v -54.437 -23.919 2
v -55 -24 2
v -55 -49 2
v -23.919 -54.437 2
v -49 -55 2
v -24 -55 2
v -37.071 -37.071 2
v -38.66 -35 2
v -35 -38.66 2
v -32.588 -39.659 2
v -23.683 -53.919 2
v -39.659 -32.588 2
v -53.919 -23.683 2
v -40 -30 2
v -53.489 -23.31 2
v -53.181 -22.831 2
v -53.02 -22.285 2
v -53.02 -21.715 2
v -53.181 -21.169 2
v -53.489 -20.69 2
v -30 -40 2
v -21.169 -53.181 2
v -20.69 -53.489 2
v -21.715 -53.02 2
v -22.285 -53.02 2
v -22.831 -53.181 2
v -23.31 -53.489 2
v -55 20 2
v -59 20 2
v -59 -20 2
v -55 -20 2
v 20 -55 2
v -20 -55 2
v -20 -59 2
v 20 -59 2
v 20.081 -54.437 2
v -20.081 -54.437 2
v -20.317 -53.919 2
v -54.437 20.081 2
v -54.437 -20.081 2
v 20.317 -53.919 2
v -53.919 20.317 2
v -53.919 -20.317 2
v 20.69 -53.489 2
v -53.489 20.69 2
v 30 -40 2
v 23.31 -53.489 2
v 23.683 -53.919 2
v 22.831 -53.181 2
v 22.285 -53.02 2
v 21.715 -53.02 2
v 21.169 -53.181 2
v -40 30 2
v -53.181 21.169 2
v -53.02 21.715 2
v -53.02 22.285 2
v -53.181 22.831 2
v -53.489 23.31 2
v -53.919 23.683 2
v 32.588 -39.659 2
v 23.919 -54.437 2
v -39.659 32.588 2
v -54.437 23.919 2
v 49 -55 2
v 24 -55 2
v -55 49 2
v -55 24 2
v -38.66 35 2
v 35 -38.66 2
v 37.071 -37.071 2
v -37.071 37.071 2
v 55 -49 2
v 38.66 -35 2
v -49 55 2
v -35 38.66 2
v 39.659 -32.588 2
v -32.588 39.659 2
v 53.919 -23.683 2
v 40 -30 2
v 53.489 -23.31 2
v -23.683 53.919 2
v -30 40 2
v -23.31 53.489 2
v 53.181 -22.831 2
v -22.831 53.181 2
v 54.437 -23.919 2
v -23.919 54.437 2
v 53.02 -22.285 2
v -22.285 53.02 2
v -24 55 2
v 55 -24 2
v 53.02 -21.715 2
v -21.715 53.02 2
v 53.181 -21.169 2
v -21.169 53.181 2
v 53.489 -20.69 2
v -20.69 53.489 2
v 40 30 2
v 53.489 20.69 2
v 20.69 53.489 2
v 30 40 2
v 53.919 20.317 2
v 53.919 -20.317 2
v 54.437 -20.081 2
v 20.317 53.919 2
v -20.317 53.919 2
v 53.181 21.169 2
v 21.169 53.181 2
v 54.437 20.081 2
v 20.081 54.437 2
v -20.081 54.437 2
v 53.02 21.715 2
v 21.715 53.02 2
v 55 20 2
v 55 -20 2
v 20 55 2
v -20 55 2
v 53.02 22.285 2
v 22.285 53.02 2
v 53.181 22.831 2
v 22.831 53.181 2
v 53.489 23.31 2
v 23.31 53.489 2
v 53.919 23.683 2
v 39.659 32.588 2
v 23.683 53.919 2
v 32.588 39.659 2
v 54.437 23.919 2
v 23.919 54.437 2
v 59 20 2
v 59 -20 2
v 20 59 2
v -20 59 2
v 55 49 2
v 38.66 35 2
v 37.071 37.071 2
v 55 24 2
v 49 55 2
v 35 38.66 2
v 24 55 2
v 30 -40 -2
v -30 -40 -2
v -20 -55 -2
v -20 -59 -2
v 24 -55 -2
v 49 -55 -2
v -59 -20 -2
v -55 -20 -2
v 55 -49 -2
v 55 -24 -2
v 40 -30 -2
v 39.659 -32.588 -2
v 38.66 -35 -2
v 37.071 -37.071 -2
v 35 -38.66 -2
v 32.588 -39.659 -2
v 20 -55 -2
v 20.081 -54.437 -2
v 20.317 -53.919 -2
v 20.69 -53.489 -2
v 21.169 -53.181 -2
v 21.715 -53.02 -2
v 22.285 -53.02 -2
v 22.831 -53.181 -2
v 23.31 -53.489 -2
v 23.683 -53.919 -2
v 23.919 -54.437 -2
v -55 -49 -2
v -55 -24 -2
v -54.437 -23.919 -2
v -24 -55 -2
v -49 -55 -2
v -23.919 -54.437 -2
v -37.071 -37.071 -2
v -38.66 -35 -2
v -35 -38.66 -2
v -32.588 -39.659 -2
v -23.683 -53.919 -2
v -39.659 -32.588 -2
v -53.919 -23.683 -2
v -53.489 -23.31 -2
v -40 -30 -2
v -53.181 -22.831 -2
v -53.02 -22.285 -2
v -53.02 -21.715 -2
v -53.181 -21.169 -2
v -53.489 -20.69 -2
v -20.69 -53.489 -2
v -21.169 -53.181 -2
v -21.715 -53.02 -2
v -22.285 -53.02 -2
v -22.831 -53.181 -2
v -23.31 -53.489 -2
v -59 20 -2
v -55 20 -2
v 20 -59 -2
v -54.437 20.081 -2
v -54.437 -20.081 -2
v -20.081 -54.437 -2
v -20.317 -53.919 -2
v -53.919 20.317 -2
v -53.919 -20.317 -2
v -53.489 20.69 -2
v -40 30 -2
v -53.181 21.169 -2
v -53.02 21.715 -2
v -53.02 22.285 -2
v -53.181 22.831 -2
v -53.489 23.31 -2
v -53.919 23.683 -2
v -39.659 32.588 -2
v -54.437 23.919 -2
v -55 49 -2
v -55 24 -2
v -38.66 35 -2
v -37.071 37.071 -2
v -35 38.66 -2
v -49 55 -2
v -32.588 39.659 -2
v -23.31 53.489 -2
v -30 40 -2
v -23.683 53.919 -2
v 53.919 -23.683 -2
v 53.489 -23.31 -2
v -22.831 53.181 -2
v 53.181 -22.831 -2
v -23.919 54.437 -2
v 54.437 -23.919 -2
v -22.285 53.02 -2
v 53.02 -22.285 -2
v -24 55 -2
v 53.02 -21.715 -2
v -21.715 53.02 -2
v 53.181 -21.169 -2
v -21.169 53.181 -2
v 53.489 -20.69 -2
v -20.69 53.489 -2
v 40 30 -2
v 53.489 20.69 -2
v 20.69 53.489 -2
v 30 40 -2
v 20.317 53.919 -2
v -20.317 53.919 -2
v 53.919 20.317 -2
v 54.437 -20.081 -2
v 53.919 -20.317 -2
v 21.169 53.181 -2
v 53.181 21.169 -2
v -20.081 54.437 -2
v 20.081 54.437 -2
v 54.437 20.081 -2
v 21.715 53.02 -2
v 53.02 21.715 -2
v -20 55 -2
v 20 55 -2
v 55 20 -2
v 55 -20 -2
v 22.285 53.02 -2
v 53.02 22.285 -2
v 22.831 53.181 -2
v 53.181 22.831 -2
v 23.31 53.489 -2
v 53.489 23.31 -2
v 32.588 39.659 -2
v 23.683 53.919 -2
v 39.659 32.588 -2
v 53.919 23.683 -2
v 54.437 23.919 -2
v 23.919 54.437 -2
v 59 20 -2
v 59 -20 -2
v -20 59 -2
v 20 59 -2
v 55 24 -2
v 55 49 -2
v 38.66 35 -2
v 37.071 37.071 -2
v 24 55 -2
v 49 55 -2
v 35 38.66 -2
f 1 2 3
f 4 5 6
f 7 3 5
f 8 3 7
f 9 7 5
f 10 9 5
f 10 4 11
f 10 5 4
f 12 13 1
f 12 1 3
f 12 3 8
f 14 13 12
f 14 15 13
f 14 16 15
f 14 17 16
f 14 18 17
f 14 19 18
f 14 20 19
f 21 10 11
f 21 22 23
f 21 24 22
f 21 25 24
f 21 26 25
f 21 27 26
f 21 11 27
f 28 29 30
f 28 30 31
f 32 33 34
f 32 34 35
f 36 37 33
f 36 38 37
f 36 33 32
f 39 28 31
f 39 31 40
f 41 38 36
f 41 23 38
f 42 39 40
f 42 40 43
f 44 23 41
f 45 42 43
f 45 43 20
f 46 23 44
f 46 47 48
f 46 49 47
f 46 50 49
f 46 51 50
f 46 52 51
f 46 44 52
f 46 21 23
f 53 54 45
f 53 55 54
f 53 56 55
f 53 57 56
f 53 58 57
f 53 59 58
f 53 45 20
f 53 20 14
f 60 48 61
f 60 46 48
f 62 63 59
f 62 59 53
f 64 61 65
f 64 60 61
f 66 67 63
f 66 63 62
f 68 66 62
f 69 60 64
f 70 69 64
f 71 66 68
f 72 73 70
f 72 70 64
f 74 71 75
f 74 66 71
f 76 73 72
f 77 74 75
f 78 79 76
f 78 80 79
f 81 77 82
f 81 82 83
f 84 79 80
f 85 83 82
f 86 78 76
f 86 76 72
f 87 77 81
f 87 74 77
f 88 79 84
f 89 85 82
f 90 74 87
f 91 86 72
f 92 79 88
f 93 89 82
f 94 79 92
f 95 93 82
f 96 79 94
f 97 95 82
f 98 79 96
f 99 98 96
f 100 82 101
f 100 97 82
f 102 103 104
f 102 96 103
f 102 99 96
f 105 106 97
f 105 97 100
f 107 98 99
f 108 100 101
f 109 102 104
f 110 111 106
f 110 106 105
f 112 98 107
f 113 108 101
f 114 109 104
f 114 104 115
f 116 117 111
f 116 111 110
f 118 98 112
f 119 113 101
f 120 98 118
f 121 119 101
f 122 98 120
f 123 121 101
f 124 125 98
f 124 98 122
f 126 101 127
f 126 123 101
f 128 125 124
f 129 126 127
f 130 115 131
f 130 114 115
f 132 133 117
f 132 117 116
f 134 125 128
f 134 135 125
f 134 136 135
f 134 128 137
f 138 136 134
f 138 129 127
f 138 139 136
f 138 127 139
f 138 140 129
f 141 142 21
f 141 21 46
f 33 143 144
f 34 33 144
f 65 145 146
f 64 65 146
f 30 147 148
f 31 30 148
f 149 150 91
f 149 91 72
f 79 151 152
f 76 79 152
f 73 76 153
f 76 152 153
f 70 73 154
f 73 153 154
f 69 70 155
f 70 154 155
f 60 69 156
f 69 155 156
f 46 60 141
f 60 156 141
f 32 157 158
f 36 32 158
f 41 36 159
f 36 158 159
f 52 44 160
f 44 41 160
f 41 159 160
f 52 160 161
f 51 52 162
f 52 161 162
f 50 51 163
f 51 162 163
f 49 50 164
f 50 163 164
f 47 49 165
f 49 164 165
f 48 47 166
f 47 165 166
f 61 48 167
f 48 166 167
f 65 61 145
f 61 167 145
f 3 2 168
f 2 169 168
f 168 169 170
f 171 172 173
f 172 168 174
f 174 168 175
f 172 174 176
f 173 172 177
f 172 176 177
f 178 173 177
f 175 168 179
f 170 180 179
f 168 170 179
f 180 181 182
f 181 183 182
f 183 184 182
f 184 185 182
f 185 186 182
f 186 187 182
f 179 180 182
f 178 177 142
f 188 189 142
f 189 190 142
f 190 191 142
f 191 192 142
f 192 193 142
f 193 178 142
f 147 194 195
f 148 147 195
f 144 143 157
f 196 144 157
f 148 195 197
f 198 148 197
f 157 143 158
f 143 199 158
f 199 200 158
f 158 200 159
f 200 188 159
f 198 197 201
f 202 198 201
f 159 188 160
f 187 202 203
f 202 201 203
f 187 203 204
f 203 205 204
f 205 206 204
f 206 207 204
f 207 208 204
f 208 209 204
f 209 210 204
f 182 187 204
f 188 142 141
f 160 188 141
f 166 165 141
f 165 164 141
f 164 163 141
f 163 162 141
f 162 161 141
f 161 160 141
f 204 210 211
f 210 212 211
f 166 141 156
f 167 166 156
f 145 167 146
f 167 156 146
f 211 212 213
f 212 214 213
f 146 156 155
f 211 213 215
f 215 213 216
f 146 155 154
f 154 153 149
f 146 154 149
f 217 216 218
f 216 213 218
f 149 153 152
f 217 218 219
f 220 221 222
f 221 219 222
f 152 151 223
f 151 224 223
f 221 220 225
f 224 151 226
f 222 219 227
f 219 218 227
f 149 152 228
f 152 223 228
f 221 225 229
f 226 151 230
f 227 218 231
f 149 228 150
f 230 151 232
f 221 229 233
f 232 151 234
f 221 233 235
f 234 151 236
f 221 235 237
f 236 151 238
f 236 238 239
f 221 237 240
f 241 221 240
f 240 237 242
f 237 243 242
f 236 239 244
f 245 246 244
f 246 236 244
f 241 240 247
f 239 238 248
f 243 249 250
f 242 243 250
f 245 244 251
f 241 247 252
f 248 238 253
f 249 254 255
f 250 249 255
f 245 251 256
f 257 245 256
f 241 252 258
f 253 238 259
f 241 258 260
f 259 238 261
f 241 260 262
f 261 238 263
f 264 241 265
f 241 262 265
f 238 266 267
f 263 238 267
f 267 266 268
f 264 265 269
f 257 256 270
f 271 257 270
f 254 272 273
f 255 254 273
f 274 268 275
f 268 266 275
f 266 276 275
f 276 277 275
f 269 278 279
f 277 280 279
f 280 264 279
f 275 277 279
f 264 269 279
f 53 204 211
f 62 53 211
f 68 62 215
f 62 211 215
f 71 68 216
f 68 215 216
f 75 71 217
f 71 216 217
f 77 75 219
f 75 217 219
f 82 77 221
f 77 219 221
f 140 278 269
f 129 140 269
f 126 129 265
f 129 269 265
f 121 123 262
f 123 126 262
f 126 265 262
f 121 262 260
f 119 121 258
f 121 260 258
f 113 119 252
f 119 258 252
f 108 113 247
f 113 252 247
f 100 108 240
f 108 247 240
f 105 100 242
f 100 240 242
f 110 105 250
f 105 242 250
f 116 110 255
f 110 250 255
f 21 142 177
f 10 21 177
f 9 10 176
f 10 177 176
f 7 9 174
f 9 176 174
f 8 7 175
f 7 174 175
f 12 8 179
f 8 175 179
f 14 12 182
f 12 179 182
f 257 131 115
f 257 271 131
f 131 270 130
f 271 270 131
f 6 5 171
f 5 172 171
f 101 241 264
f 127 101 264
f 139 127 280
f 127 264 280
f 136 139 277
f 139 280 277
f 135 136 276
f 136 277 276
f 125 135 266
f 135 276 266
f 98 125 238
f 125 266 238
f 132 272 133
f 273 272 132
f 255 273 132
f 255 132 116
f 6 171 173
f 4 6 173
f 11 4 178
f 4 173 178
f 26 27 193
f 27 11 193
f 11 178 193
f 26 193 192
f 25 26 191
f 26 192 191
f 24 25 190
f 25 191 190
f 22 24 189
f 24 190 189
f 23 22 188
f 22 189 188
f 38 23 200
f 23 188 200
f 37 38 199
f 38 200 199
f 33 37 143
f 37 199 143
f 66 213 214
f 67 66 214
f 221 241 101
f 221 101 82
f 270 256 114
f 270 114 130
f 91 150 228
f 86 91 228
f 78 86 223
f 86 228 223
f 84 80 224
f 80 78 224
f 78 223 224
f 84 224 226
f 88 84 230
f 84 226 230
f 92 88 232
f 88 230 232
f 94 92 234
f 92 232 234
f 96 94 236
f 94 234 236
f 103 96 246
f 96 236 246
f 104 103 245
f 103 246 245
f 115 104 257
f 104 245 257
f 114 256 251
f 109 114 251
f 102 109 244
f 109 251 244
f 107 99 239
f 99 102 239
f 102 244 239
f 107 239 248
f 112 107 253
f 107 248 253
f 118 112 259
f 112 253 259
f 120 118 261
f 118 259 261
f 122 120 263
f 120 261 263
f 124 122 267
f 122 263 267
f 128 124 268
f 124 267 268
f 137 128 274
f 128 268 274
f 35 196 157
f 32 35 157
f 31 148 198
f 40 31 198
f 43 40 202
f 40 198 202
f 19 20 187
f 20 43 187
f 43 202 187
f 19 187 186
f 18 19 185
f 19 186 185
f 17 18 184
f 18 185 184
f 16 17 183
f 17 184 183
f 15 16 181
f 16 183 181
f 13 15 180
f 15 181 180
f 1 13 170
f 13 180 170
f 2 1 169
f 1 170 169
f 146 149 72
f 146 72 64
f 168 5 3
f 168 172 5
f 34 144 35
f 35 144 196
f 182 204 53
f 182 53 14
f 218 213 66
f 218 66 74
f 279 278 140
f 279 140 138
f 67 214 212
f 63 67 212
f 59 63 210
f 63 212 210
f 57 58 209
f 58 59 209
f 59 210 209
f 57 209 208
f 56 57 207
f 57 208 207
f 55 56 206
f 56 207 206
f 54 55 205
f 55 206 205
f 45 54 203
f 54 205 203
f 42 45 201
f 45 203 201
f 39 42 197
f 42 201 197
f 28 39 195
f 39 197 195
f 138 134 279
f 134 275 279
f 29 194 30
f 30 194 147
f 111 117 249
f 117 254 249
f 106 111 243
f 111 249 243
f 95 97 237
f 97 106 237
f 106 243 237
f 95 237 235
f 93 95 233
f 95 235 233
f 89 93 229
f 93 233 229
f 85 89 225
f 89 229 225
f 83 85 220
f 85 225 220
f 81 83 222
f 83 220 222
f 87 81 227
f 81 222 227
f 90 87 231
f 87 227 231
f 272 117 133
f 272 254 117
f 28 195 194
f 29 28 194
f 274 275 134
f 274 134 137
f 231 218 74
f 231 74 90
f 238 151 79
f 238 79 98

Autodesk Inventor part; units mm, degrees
ref_plane "YZ Plane" through (0, 0, 0) normal (1, 0, 0) x (0, 1, 0)
ref_plane "XZ Plane" through (0, 0, 0) normal (0, 1, 0) x (-1, 0, 0)
ref_plane "XY Plane" through (0, 0, 0) normal (0, 0, 1) x (1, 0, 0)
sketch "Boceto1" plane through (0, 0, 0) normal (0, 0, 1) x (1, 0, 0)
  line L0 (0, 82.4534) -> (0, -82.4534) construction
  line L1 (-81.8976, 0) -> (81.8976, 0) construction
  line L2 (55, 49) -> (55, 24)
  arc A0 (55, 24) -> (55, 20) centre (55, 22) ccw
  line L3 (55, 20) -> (59, 20)
  line L4 (59, 20) -> (59, -20)
  line L5 (59, -20) -> (55, -20)
  arc A1 (55, -20) -> (55, -24) centre (55, -22) ccw
  line L6 (55, -24) -> (55, -49)
  line L7 (-55, 49) -> (-55, 24)
  arc A2 (-55, 20) -> (-55, 24) centre (-55, 22) ccw
  line L8 (-55, 20) -> (-59, 20)
  line L9 (-59, 20) -> (-59, -20)
  line L10 (-59, -20) -> (-55, -20)
  arc A3 (-55, -24) -> (-55, -20) centre (-55, -22) ccw
  line L11 (-55, -24) -> (-55, -49)
  line L12 (-49, 55) -> (-24, 55)
  line L13 (24, 55) -> (49, 55)
  line L14 (-49, -55) -> (-24, -55)
  line L15 (24, -55) -> (49, -55)
  arc A4 (-24, 55) -> (-20, 55) centre (-22, 55) ccw
  line L16 (-20, 55) -> (-20, 59)
  line L17 (-20, 59) -> (20, 59)
  line L18 (20, 59) -> (20, 55)
  arc A5 (20, 55) -> (24, 55) centre (22, 55) ccw
  arc A6 (-20, -55) -> (-24, -55) centre (-22, -55) ccw
  line L19 (-20, -55) -> (-20, -59)
  line L20 (-20, -59) -> (20, -59)
  line L21 (20, -59) -> (20, -55)
  arc A7 (24, -55) -> (20, -55) centre (22, -55) ccw
  line L22 (-55, 49) -> (-49, 55)
  line L23 (55, 49) -> (49, 55)
  line L24 (55, -49) -> (49, -55)
  line L25 (-49, -55) -> (-55, -49)
  line L26 (-40, 30) -> (-40, -30)
  arc A8 (-40, -30) -> (-30, -40) centre (-30, -30) ccw
  line L27 (-30, -40) -> (30, -40)
  arc A9 (30, -40) -> (40, -30) centre (30, -30) ccw
  line L28 (40, -30) -> (40, 30)
  arc A10 (40, 30) -> (30, 40) centre (30, 30) ccw
  line L29 (30, 40) -> (-30, 40)
  arc A11 (-30, 40) -> (-40, 30) centre (-30, 30) ccw
  point P0 (0, 0)
  point P1 (0, 0)
  point P2 (55, 55)
  point P3 (55, -55)
  point P4 (-55, 55)
  point P5 (-55, -55)
  point P6 (55, -55)
  point P7 (-59, 0)
  point P8 (55, -55)
  point P9 (-40, 0)
  point P10 (0, 40)
  dimension "d0" = 110
  dimension "d1" = 40
  dimension "d2" = 2
  dimension "d3" = 110
  dimension "d7" = 4
  dimension "d8" = 6
  dimension "d9" = 6
  dimension "d10" = 6
  dimension "d11" = 6
  dimension "d12" = 6
  dimension "d13" = 6
  dimension "d14" = 6
  dimension "d15" = 6
  dimension "d16" = 15
  dimension "d17" = 10
extrude "Extrusión1" add sketch "Boceto1" along normal mid plane 4
equation "\"d9\" = d8"
equation "\"d10\" = d8"
equation "\"d11\" = d10"
equation "\"d12\" = d8"
equation "\"d13\" = d12"
equation "\"d14\" = d8"
equation "\"d15\" = d14"
properties part number "refuerzo interior"
